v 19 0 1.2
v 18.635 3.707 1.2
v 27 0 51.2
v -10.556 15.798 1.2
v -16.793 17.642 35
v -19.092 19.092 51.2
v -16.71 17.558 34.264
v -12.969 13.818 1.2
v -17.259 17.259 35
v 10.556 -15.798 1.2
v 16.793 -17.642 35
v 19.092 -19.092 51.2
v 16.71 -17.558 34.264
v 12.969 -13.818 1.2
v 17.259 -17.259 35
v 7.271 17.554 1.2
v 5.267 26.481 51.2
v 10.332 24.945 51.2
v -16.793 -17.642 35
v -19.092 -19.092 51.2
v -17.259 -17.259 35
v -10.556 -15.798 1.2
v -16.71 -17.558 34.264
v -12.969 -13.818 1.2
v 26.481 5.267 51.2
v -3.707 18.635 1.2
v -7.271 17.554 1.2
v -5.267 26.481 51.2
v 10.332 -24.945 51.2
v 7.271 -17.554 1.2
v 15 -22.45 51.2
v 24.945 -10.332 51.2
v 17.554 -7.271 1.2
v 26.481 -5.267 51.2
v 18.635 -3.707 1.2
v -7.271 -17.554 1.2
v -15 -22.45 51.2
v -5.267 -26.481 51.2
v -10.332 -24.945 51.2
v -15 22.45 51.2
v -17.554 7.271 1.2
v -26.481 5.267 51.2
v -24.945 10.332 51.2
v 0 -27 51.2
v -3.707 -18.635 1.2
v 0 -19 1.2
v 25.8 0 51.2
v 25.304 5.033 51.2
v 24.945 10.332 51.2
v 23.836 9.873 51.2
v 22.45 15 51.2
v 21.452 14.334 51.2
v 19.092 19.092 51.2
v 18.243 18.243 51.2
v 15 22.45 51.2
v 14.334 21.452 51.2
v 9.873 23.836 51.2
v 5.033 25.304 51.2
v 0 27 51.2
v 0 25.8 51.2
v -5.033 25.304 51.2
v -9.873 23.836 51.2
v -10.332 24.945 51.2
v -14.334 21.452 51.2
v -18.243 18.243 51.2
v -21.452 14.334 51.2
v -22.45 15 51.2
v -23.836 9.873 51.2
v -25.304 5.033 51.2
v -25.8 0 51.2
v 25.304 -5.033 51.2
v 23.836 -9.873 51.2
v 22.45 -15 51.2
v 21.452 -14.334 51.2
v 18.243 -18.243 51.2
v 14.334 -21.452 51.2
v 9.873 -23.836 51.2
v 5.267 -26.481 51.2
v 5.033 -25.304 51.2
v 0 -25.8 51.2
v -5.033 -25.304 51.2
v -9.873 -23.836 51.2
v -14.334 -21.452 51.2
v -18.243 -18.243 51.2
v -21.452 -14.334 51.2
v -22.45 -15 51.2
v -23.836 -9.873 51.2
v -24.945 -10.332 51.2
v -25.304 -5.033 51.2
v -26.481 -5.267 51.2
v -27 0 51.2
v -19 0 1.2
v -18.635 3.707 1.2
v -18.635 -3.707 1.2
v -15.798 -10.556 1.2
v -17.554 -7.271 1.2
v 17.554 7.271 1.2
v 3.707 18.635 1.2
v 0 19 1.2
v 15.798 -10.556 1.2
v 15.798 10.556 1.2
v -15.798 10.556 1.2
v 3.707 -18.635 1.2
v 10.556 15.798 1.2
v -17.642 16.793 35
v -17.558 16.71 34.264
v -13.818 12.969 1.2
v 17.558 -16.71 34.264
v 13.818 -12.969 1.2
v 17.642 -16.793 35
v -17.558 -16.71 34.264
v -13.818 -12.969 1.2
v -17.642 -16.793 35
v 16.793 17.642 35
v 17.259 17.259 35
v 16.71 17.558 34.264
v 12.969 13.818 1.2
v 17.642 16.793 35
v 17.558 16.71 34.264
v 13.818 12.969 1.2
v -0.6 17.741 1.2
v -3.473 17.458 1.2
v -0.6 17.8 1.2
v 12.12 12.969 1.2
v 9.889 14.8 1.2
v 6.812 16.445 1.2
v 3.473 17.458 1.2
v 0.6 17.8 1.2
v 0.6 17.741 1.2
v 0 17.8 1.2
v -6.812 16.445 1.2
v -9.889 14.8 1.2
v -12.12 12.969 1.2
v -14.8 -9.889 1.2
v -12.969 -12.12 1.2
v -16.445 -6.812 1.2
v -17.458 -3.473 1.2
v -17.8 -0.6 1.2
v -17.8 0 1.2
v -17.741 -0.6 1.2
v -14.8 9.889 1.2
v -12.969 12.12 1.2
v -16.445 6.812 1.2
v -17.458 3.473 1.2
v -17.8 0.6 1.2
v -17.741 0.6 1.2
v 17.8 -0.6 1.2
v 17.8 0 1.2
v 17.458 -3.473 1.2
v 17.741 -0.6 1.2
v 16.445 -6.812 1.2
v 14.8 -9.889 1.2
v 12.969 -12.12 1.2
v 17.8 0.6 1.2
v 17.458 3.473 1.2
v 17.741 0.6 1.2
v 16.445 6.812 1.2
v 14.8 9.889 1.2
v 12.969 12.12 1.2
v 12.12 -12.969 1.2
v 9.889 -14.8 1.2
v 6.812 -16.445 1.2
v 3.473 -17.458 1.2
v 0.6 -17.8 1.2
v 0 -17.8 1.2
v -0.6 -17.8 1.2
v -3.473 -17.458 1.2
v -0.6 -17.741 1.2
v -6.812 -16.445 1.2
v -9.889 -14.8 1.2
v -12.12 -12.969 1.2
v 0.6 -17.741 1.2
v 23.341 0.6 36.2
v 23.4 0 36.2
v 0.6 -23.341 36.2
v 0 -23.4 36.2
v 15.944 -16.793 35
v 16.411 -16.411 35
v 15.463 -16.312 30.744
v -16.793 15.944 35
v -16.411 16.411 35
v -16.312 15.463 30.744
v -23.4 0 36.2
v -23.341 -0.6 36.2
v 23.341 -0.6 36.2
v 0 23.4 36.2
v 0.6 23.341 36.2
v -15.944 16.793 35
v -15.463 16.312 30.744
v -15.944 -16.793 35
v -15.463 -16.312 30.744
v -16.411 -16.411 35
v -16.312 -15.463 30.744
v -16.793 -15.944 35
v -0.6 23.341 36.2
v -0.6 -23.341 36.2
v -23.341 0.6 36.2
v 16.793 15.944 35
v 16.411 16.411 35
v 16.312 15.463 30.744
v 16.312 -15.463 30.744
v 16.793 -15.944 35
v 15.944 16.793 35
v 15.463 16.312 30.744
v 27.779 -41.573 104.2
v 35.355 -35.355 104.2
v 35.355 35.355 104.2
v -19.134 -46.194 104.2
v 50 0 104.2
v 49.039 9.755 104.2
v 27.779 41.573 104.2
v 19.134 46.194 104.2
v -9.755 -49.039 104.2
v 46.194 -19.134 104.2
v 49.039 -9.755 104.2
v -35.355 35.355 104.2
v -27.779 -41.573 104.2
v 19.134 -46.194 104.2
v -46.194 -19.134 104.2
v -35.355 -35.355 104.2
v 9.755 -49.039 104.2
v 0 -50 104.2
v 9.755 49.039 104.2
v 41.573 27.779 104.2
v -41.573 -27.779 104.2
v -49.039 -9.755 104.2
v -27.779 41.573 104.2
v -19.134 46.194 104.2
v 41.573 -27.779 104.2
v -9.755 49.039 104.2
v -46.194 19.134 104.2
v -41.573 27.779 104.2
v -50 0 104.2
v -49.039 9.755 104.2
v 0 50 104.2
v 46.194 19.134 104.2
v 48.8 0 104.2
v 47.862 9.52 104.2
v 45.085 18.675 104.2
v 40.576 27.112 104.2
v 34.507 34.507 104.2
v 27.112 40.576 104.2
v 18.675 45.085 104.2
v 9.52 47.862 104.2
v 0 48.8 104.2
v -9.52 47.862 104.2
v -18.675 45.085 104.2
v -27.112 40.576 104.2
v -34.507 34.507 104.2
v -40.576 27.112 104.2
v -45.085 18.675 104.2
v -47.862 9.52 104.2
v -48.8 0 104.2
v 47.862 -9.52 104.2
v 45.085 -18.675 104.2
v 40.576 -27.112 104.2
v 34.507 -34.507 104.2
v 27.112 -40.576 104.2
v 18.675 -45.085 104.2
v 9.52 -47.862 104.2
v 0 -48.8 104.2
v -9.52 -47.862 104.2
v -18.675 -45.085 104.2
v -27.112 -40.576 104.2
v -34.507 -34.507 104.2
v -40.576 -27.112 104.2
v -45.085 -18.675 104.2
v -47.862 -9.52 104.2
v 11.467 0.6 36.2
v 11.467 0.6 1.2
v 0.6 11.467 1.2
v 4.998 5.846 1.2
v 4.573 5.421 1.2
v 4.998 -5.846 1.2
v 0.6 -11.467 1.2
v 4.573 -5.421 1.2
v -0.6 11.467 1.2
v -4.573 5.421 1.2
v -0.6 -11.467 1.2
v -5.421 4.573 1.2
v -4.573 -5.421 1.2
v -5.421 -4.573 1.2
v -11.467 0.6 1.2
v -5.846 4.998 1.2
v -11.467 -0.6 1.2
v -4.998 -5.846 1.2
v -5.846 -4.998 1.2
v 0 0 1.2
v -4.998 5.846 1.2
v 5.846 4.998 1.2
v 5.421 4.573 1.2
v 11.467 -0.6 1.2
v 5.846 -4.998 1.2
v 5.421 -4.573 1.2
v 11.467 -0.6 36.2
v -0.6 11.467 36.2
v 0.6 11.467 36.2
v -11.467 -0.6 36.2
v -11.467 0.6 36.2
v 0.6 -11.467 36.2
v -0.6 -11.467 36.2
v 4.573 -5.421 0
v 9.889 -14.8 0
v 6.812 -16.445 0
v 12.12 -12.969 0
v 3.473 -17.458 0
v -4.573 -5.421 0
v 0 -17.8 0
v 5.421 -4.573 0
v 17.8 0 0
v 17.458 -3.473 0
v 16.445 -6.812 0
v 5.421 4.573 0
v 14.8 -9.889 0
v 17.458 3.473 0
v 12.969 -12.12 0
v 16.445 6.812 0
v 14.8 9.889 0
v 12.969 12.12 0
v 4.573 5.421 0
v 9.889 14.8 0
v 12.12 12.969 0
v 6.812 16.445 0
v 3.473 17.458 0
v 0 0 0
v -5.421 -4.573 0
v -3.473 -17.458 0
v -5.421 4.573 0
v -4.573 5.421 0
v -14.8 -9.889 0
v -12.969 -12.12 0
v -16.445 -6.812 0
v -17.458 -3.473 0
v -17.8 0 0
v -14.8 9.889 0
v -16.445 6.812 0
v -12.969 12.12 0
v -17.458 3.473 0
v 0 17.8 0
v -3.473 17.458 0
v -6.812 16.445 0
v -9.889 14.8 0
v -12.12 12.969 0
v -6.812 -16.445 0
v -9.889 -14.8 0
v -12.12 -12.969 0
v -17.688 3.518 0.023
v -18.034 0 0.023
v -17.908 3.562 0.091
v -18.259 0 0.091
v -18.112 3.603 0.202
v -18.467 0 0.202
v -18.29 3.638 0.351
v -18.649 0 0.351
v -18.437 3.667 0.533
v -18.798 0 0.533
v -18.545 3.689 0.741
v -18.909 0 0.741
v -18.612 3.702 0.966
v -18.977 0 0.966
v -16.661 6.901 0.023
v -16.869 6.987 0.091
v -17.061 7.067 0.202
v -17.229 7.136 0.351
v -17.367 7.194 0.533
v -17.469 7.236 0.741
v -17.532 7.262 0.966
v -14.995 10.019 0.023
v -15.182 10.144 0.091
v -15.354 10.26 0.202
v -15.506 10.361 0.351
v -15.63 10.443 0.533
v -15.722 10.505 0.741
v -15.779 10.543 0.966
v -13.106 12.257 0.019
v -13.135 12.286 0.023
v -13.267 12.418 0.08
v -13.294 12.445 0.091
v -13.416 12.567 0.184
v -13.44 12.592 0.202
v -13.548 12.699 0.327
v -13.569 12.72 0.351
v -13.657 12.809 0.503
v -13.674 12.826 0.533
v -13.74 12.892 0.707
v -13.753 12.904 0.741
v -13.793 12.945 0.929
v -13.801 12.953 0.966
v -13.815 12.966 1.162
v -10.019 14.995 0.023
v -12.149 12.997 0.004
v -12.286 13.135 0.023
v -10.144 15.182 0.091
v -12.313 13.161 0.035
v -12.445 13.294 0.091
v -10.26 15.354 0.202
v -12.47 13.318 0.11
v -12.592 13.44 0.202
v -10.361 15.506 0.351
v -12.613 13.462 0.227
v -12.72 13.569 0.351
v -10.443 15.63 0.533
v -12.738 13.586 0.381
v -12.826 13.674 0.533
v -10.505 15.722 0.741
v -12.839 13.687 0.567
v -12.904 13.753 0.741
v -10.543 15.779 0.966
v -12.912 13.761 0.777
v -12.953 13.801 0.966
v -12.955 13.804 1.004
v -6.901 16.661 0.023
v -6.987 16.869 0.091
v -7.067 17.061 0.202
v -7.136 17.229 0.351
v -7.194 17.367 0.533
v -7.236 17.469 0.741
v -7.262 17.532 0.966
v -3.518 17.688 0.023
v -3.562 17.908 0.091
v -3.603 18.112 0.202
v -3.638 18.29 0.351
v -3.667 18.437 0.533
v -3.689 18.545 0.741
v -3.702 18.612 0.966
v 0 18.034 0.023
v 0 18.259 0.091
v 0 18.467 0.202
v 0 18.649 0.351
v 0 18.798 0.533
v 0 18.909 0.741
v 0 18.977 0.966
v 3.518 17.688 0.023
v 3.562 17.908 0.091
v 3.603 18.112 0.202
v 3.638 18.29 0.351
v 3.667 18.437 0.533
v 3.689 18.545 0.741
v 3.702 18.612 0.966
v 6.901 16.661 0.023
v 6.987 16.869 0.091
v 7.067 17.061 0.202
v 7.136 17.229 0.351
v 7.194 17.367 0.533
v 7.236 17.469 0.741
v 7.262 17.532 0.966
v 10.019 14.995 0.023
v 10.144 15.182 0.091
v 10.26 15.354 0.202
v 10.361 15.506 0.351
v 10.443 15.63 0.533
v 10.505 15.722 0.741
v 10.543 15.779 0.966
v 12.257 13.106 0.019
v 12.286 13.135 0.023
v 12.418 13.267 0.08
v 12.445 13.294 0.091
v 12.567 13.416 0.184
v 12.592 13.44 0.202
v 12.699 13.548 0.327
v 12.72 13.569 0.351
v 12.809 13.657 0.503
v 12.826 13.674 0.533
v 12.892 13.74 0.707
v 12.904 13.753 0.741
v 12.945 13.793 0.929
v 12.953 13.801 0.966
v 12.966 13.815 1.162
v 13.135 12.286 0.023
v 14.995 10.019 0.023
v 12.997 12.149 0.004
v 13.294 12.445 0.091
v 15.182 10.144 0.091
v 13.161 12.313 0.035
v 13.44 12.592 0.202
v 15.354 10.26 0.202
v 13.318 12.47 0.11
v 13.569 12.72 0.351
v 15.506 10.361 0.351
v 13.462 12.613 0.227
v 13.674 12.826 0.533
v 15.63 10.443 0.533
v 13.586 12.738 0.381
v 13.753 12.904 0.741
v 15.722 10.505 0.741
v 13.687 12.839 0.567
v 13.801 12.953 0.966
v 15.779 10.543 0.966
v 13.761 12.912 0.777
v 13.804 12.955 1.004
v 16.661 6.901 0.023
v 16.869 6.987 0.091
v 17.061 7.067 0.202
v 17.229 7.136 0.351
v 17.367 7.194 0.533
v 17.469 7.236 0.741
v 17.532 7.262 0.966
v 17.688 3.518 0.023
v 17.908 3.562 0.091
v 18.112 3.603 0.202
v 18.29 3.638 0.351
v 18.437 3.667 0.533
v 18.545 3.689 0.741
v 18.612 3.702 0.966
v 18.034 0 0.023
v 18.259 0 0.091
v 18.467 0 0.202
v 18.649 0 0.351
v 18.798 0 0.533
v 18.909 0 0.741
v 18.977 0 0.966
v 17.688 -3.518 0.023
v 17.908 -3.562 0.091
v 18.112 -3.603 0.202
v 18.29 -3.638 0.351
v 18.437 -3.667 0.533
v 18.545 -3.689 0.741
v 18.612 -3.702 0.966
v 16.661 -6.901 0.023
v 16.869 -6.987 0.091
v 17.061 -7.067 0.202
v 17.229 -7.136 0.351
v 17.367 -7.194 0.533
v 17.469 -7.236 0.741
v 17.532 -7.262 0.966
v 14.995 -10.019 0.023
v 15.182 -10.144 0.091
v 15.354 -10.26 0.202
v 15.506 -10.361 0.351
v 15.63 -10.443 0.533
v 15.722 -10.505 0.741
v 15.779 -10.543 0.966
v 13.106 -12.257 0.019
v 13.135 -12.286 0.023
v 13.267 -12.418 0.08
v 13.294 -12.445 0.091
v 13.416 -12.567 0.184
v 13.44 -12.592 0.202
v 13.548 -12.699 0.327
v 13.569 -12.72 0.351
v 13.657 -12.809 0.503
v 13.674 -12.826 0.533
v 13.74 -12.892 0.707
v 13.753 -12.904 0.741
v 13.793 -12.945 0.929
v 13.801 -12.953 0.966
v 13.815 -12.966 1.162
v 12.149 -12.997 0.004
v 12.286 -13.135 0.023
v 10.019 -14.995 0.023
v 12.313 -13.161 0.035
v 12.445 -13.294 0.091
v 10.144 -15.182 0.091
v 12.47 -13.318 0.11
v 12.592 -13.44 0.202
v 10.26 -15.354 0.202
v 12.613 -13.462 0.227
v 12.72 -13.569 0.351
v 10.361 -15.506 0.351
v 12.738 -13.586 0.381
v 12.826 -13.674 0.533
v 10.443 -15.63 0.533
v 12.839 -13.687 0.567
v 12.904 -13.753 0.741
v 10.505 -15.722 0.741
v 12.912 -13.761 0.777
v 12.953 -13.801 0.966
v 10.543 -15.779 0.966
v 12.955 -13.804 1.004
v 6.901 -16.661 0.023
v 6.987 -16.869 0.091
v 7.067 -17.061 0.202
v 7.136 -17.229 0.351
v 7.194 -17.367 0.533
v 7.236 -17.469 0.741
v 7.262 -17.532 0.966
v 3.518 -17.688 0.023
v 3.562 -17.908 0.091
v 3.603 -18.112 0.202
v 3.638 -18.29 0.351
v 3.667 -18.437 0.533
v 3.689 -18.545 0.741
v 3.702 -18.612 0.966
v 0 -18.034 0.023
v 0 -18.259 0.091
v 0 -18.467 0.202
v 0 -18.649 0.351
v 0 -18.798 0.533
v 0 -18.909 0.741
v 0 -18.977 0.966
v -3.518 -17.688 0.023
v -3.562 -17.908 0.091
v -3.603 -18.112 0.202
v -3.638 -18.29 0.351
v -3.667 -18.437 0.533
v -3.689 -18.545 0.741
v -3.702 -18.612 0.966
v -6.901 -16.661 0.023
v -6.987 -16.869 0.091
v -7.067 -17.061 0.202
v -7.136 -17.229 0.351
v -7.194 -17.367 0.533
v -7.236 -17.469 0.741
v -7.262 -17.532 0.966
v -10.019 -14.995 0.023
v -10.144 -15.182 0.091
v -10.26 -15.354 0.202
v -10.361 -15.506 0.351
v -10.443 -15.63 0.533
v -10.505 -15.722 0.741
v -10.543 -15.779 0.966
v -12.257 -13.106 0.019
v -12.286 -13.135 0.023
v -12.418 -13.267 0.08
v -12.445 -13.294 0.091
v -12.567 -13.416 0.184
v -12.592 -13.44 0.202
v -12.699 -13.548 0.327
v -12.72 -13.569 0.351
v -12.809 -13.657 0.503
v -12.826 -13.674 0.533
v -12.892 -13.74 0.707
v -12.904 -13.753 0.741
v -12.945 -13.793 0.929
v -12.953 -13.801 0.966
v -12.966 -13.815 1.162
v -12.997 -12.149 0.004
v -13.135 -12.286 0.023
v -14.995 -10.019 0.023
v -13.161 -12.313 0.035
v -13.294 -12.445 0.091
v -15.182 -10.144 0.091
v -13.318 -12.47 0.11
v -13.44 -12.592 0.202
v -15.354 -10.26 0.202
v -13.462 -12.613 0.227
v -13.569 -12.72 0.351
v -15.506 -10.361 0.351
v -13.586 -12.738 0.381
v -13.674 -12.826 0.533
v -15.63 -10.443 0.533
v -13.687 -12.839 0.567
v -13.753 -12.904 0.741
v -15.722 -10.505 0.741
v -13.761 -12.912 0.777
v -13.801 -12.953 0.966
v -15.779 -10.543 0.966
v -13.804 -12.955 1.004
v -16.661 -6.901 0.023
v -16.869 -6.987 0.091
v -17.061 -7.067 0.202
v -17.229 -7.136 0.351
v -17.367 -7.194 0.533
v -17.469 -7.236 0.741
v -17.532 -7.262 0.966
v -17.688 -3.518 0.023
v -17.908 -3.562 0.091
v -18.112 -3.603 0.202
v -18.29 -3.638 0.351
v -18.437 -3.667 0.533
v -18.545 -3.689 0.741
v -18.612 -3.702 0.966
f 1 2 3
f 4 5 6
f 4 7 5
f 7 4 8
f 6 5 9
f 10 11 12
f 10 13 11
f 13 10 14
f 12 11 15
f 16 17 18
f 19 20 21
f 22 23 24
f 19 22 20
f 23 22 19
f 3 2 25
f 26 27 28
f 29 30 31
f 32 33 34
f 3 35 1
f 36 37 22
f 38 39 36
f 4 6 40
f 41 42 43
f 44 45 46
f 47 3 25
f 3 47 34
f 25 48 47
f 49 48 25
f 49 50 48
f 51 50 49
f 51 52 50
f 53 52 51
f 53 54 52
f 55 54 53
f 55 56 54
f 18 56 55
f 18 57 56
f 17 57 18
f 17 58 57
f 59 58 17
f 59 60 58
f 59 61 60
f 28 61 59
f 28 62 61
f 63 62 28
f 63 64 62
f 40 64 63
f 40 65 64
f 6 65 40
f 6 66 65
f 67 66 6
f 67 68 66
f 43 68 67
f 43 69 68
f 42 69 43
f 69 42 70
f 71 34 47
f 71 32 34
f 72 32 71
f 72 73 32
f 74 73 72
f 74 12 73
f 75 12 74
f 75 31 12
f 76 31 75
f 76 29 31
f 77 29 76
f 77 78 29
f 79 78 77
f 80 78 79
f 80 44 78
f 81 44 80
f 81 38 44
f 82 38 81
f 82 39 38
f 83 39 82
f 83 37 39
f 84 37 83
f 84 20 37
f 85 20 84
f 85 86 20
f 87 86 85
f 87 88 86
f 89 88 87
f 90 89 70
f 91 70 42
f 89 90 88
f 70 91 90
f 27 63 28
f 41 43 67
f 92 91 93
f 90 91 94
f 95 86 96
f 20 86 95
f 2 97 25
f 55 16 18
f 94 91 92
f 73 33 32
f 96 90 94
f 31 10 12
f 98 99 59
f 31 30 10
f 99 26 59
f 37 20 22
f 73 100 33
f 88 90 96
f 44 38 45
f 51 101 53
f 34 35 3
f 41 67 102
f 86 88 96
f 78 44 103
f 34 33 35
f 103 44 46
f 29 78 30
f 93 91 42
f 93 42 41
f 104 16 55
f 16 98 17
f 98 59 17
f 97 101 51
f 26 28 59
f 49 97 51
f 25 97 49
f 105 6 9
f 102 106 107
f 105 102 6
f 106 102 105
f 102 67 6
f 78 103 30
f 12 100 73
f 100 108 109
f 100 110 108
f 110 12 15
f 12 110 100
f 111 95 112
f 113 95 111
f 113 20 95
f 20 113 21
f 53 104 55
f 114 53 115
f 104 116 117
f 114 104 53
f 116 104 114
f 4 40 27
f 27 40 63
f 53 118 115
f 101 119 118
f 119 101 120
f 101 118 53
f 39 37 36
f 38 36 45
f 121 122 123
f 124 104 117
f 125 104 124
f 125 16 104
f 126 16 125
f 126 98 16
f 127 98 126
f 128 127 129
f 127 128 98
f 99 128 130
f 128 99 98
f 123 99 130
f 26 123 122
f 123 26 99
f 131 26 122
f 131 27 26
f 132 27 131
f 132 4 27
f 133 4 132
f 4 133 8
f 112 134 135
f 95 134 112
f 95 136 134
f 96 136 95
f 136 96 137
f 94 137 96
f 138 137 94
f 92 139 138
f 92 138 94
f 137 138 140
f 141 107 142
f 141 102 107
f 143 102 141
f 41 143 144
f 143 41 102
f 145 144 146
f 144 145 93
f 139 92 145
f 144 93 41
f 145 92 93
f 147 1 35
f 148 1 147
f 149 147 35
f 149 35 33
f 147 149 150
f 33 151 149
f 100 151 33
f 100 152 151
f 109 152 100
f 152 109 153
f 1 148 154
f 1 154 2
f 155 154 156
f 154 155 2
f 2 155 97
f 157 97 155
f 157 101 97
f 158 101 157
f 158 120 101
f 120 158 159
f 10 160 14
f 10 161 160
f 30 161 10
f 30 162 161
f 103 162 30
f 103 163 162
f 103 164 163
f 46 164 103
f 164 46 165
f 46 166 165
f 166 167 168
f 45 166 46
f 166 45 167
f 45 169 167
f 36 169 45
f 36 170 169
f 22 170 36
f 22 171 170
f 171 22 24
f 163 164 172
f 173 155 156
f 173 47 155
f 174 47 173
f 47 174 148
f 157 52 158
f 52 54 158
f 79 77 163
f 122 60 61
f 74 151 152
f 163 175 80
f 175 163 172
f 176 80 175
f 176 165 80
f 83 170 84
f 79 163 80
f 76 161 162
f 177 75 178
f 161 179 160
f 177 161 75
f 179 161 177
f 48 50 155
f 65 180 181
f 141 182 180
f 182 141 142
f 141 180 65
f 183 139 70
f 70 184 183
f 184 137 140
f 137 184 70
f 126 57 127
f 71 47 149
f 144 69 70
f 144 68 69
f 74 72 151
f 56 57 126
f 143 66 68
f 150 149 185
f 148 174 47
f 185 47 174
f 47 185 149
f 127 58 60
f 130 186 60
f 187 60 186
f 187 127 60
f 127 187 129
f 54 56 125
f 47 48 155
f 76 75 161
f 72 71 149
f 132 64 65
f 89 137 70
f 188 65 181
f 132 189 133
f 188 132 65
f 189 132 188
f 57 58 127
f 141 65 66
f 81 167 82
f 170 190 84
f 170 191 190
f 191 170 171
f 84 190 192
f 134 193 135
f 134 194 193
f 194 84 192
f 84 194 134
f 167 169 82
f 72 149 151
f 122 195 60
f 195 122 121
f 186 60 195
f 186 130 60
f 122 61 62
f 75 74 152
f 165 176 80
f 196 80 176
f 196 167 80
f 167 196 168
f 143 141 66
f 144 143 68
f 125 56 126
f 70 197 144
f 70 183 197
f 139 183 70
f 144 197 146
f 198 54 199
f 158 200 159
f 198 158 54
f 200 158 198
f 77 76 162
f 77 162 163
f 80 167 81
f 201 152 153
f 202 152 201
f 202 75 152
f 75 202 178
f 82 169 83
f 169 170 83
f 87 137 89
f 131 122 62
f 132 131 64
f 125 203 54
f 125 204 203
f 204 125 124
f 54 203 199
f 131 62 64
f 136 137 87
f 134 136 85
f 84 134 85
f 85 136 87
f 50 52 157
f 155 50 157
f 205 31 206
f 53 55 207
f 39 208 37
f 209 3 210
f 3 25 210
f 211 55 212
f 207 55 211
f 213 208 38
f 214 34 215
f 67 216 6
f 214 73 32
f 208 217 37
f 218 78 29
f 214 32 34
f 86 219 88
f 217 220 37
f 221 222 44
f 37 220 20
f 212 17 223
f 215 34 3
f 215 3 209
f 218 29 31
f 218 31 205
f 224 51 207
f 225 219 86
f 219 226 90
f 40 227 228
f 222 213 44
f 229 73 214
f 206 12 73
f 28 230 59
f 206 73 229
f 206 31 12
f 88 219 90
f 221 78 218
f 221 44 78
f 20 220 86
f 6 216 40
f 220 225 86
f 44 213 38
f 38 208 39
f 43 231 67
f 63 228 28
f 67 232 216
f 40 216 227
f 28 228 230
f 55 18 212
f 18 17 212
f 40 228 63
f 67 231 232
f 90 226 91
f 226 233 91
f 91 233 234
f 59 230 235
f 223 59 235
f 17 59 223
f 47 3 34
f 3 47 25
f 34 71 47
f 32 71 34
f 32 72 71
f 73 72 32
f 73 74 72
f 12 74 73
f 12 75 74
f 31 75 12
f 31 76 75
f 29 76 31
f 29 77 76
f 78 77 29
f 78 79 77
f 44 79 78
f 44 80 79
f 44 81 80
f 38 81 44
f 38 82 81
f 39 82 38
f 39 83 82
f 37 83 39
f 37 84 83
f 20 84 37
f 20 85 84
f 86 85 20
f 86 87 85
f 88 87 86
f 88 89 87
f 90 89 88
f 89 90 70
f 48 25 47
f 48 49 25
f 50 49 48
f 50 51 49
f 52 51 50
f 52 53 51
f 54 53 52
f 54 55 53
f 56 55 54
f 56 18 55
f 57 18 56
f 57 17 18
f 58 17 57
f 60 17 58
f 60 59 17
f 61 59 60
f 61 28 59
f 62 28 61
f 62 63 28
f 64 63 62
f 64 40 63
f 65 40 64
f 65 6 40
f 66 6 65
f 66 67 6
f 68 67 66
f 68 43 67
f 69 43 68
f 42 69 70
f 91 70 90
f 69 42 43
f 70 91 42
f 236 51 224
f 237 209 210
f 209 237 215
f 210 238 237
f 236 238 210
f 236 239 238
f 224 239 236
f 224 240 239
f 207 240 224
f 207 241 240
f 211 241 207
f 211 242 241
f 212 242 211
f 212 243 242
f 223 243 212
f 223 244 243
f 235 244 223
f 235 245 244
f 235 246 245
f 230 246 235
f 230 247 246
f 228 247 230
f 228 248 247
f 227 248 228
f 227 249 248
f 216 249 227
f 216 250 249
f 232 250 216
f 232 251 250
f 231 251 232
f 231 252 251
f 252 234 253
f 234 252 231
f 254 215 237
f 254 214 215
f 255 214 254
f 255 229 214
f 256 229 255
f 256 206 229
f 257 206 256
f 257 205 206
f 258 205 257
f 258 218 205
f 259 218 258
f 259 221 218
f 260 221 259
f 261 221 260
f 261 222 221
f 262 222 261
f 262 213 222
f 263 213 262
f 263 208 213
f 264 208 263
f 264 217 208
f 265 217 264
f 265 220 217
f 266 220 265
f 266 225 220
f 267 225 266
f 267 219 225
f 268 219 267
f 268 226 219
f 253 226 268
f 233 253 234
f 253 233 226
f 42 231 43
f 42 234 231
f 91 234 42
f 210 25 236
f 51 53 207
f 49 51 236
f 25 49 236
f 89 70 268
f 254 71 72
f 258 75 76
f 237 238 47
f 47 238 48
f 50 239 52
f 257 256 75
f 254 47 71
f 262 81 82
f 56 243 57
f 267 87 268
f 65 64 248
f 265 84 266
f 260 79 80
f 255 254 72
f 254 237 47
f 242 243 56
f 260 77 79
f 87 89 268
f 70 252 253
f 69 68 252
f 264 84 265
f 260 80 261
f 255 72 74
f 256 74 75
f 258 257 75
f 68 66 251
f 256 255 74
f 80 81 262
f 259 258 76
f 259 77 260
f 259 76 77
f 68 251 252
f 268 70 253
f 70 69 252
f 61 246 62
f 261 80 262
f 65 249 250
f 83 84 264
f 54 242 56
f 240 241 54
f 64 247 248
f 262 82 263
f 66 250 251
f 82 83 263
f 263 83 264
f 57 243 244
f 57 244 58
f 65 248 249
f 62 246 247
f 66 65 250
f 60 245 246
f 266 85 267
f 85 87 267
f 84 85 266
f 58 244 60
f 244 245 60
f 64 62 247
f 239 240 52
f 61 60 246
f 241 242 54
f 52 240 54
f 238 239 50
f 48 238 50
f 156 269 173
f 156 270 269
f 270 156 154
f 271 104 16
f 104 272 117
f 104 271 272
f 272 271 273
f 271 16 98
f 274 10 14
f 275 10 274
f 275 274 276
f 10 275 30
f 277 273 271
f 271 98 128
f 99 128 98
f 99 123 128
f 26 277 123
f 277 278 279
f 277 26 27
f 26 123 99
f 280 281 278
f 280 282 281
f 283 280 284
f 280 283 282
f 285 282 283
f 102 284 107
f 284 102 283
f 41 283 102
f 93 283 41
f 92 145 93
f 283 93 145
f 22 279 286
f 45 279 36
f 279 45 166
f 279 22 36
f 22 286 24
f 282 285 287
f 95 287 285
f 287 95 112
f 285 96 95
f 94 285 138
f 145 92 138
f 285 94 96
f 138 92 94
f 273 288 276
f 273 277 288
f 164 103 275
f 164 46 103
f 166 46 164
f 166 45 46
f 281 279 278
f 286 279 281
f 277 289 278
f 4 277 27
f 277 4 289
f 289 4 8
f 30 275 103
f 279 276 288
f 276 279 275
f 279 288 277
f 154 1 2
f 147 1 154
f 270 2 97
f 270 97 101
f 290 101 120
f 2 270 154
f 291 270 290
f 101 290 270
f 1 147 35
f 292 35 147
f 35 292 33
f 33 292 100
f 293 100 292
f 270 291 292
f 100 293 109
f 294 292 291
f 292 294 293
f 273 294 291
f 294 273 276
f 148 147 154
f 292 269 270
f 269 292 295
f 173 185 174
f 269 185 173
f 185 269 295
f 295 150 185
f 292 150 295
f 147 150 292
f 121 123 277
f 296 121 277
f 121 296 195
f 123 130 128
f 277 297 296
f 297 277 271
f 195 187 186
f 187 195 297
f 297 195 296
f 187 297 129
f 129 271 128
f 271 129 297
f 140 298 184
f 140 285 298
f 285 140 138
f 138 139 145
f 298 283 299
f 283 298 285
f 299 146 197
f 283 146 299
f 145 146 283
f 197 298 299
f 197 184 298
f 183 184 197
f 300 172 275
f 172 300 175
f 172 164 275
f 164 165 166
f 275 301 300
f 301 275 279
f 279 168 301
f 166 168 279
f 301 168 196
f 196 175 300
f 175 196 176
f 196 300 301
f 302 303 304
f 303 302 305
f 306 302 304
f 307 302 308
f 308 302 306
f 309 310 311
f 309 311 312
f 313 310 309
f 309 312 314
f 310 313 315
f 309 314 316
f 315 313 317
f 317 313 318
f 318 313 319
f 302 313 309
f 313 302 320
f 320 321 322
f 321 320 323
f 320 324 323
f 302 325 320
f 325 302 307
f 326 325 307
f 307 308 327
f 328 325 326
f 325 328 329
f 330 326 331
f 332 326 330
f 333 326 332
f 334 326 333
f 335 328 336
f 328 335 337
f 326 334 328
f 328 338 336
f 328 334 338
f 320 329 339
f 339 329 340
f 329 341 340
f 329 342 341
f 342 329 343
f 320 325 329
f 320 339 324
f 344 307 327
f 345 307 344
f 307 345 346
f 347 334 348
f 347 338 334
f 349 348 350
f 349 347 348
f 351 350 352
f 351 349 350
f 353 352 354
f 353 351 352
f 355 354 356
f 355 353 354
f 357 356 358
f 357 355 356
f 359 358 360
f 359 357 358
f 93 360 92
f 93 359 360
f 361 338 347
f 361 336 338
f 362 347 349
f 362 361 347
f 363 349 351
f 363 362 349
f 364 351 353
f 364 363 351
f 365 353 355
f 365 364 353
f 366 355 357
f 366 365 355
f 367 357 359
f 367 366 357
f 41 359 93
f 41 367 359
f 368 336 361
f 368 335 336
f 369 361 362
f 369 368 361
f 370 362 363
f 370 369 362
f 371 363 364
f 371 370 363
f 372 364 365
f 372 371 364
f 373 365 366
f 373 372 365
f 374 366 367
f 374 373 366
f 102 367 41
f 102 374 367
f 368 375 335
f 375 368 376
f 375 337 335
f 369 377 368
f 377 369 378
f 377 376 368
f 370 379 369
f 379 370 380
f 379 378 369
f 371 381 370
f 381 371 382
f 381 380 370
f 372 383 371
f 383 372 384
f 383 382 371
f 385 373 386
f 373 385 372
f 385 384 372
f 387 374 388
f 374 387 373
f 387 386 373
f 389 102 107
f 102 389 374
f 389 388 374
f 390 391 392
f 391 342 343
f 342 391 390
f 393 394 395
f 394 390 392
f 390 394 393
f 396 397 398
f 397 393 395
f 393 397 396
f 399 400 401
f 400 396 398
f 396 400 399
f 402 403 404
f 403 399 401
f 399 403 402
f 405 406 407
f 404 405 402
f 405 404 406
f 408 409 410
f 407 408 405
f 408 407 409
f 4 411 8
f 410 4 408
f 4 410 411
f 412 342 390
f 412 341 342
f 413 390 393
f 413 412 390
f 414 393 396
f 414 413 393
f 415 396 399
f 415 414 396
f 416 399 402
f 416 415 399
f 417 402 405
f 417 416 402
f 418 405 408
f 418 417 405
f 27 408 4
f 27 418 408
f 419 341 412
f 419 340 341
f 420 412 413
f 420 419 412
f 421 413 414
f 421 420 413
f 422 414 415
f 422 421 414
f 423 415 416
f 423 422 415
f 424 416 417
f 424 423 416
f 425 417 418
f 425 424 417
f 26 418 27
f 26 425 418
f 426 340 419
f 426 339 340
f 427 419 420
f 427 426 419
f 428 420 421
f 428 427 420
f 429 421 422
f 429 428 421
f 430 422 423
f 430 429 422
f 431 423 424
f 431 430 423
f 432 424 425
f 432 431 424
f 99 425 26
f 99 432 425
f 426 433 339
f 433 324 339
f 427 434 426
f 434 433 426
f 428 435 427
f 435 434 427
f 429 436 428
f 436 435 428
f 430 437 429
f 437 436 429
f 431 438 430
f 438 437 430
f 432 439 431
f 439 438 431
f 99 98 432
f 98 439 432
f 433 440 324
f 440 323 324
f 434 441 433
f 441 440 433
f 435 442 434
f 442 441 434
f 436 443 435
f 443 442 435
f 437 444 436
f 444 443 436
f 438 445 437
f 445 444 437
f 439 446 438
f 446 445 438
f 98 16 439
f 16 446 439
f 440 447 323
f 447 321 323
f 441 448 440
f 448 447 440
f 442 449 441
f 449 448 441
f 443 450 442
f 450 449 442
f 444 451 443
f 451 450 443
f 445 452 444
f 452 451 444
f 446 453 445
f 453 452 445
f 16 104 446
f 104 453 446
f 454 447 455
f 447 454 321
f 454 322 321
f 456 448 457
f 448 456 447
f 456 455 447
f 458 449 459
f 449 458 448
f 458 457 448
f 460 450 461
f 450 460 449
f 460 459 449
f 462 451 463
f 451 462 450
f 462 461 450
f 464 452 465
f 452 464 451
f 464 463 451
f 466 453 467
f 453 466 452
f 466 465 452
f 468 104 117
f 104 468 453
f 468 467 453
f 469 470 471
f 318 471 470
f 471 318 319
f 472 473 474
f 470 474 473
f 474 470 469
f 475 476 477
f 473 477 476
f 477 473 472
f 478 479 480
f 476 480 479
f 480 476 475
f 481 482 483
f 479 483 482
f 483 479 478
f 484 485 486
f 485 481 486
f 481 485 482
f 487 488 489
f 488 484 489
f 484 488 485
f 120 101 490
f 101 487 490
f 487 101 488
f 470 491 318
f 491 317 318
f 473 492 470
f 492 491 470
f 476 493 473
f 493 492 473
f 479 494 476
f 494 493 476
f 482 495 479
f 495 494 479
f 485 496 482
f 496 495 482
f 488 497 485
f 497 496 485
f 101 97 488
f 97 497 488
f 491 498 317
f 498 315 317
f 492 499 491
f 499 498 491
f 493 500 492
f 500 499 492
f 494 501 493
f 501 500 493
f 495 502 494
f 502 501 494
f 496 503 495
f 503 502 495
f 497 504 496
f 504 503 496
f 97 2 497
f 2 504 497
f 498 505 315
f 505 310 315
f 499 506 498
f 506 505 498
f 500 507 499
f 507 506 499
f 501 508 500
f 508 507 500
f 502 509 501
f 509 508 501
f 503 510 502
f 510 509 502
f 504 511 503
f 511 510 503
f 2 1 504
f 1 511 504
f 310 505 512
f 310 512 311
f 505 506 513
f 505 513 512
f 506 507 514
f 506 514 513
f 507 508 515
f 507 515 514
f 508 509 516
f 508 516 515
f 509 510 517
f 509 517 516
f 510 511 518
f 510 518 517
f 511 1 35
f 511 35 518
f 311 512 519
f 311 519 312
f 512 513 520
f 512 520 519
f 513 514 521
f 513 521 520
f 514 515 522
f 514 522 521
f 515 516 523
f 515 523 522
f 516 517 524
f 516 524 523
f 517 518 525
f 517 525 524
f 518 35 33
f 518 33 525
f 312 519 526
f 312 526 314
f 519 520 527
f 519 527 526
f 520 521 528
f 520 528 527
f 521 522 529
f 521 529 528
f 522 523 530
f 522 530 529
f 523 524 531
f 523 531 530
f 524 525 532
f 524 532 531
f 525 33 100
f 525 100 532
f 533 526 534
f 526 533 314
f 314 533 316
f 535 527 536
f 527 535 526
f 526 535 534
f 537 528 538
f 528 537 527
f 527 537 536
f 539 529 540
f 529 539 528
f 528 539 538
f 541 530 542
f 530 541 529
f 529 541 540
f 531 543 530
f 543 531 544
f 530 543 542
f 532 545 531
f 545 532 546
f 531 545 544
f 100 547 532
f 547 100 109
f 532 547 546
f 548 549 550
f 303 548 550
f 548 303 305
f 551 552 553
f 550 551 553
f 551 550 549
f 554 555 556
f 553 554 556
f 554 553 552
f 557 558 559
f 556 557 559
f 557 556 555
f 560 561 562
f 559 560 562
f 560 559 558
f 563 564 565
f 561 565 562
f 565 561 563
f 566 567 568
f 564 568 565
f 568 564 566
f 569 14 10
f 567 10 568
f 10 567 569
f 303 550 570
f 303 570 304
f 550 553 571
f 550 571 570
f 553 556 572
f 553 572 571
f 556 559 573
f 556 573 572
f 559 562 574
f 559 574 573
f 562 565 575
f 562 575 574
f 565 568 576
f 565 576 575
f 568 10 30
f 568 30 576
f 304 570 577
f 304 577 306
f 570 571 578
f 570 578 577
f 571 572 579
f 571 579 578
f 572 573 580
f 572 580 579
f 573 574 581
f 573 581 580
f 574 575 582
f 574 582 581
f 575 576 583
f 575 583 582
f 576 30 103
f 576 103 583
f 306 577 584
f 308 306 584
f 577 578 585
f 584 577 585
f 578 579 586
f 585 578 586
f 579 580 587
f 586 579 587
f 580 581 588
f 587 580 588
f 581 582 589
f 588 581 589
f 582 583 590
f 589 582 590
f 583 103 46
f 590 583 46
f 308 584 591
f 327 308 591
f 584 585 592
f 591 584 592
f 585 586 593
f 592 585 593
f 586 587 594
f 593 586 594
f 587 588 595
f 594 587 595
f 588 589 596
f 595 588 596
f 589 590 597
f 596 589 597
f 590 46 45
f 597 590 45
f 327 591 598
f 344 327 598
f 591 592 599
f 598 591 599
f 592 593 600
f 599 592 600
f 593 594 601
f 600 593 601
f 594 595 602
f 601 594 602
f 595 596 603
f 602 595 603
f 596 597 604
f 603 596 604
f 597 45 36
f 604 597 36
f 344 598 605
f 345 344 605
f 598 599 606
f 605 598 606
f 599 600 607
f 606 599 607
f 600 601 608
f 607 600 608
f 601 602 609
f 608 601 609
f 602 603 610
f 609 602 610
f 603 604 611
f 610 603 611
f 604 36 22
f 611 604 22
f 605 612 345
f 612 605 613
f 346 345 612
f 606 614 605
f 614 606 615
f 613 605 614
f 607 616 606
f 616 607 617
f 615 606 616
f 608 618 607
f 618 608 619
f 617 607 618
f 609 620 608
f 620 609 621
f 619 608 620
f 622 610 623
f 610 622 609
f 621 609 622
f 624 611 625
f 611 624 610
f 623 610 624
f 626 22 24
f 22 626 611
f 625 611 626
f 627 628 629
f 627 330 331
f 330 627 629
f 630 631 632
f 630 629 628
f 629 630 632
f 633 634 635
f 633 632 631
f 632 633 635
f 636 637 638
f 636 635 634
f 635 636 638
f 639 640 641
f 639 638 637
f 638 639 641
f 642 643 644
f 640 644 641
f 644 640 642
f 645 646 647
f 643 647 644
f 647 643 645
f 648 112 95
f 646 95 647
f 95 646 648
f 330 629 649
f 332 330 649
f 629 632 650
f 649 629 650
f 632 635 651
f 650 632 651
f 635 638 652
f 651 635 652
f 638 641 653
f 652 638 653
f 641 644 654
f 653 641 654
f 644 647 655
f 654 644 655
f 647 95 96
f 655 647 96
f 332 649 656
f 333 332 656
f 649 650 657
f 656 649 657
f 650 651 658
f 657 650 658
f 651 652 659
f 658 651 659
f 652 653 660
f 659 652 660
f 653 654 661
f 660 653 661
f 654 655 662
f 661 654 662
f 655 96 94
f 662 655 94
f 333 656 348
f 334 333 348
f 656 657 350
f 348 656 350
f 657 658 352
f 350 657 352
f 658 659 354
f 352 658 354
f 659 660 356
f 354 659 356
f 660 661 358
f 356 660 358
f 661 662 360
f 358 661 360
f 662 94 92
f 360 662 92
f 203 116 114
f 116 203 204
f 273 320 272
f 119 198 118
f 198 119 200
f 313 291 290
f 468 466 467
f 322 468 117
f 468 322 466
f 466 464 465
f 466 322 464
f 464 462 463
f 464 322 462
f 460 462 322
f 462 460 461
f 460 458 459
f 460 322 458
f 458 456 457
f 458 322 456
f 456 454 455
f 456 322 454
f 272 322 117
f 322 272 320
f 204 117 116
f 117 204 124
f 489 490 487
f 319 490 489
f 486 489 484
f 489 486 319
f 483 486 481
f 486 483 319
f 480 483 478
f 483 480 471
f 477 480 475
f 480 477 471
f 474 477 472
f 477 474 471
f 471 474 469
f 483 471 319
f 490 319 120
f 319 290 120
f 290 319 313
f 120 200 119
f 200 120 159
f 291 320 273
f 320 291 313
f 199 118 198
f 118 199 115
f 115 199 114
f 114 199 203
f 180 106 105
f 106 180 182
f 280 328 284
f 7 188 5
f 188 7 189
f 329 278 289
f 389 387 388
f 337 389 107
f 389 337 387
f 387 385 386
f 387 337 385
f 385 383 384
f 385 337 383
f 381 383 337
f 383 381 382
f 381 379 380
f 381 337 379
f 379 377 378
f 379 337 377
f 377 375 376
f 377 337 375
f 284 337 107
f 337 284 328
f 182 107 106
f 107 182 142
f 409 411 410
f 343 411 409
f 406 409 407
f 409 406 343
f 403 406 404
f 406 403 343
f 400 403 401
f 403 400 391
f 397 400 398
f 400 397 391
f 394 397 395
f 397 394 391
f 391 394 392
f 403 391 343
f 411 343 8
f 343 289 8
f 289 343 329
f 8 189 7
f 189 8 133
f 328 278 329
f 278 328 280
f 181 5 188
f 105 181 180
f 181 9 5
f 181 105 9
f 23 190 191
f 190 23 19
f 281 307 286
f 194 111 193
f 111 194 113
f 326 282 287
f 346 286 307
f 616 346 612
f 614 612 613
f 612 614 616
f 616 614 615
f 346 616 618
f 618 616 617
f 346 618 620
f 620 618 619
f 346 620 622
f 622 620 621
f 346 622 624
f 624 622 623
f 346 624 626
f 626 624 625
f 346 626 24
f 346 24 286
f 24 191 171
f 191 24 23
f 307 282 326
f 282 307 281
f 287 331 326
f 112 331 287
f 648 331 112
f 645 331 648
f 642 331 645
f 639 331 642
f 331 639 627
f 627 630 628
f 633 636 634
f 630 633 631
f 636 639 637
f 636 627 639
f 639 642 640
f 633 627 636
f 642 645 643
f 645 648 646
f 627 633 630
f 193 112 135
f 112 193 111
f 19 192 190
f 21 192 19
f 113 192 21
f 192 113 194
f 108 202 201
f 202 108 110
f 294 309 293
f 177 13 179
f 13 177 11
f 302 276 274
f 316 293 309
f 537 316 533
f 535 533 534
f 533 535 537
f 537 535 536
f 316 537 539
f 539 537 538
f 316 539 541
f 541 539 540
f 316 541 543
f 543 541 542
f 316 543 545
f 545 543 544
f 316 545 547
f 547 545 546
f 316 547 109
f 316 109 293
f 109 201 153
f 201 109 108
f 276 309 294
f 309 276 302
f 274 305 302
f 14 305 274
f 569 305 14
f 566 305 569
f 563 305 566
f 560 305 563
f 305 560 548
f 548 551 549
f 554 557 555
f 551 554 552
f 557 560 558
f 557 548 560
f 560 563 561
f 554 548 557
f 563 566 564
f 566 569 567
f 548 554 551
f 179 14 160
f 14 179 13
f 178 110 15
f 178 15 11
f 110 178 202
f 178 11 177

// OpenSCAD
use <../plant-pot.scad>;

$fn = $preview ? 32 : 64; // number of fractions for a circle

// High numbers produce a circle, low numbers produce a polygon (i.e. 4 = square, 6 = hexagon, etc.)
num_sides = 32; // number of sides on the pot

// Main user parameters
body_thickness = 1.2;
body_height = 50;
upper_dia = 54;
lower_dia = 38;
collar_diameter = 100;
collar_height = 53;

// Internal vertical wall parameters
ivw = true; // Internal vertical wall flag

ivw_pos = true; // flag to create internal vertical walls
ivw_neg = true; // flag to create internal vertical slots

ivw_thickness = body_thickness; // Same thickness as the body
ivw_width = lower_dia / 2 / 3;  // 1/3 of the inner lower radius
ivw_height = body_height * 0.7; // 70% of the body height
ivw_offset_angle = 90;          // Offset angle for the internal vertical walls

// Snaps to click into the holder
snap_offset = 12; // Offset from the top of the body
snap_height_pos = body_height - snap_offset;
snap_radius = body_thickness * 0.75; // Radius of the snap
snap_gaps = [ 0.5, 4 ];              // 50%  and 4 gap cuts

if (ivw)
{
    plant_pot(body_height = body_height, body_thickness = body_thickness, upper_outer_diameter = upper_dia,
              lower_outer_diameter = lower_dia, ivw_thickness = ivw_thickness, ivw_width = ivw_width,
              ivw_height = ivw_height, pos_ivw = ivw_pos, neg_ivw = ivw_neg, ivw_offset_angle = ivw_offset_angle,
              snap_position = snap_height_pos, snap_radius = snap_radius, snap_gaps = snap_gaps,
              collar_height = collar_height, collar_diameter = collar_diameter, sides = num_sides, showlines = false);
}
else
{
    plant_pot(body_height = body_height, body_thickness = body_thickness, upper_outer_diameter = upper_dia,
              lower_outer_diameter = lower_dia, snap_position = snap_height_pos, snap_radius = snap_radius,
              collar_height = collar_height, collar_diameter = collar_diameter, sides = num_sides, showlines = false);
}
